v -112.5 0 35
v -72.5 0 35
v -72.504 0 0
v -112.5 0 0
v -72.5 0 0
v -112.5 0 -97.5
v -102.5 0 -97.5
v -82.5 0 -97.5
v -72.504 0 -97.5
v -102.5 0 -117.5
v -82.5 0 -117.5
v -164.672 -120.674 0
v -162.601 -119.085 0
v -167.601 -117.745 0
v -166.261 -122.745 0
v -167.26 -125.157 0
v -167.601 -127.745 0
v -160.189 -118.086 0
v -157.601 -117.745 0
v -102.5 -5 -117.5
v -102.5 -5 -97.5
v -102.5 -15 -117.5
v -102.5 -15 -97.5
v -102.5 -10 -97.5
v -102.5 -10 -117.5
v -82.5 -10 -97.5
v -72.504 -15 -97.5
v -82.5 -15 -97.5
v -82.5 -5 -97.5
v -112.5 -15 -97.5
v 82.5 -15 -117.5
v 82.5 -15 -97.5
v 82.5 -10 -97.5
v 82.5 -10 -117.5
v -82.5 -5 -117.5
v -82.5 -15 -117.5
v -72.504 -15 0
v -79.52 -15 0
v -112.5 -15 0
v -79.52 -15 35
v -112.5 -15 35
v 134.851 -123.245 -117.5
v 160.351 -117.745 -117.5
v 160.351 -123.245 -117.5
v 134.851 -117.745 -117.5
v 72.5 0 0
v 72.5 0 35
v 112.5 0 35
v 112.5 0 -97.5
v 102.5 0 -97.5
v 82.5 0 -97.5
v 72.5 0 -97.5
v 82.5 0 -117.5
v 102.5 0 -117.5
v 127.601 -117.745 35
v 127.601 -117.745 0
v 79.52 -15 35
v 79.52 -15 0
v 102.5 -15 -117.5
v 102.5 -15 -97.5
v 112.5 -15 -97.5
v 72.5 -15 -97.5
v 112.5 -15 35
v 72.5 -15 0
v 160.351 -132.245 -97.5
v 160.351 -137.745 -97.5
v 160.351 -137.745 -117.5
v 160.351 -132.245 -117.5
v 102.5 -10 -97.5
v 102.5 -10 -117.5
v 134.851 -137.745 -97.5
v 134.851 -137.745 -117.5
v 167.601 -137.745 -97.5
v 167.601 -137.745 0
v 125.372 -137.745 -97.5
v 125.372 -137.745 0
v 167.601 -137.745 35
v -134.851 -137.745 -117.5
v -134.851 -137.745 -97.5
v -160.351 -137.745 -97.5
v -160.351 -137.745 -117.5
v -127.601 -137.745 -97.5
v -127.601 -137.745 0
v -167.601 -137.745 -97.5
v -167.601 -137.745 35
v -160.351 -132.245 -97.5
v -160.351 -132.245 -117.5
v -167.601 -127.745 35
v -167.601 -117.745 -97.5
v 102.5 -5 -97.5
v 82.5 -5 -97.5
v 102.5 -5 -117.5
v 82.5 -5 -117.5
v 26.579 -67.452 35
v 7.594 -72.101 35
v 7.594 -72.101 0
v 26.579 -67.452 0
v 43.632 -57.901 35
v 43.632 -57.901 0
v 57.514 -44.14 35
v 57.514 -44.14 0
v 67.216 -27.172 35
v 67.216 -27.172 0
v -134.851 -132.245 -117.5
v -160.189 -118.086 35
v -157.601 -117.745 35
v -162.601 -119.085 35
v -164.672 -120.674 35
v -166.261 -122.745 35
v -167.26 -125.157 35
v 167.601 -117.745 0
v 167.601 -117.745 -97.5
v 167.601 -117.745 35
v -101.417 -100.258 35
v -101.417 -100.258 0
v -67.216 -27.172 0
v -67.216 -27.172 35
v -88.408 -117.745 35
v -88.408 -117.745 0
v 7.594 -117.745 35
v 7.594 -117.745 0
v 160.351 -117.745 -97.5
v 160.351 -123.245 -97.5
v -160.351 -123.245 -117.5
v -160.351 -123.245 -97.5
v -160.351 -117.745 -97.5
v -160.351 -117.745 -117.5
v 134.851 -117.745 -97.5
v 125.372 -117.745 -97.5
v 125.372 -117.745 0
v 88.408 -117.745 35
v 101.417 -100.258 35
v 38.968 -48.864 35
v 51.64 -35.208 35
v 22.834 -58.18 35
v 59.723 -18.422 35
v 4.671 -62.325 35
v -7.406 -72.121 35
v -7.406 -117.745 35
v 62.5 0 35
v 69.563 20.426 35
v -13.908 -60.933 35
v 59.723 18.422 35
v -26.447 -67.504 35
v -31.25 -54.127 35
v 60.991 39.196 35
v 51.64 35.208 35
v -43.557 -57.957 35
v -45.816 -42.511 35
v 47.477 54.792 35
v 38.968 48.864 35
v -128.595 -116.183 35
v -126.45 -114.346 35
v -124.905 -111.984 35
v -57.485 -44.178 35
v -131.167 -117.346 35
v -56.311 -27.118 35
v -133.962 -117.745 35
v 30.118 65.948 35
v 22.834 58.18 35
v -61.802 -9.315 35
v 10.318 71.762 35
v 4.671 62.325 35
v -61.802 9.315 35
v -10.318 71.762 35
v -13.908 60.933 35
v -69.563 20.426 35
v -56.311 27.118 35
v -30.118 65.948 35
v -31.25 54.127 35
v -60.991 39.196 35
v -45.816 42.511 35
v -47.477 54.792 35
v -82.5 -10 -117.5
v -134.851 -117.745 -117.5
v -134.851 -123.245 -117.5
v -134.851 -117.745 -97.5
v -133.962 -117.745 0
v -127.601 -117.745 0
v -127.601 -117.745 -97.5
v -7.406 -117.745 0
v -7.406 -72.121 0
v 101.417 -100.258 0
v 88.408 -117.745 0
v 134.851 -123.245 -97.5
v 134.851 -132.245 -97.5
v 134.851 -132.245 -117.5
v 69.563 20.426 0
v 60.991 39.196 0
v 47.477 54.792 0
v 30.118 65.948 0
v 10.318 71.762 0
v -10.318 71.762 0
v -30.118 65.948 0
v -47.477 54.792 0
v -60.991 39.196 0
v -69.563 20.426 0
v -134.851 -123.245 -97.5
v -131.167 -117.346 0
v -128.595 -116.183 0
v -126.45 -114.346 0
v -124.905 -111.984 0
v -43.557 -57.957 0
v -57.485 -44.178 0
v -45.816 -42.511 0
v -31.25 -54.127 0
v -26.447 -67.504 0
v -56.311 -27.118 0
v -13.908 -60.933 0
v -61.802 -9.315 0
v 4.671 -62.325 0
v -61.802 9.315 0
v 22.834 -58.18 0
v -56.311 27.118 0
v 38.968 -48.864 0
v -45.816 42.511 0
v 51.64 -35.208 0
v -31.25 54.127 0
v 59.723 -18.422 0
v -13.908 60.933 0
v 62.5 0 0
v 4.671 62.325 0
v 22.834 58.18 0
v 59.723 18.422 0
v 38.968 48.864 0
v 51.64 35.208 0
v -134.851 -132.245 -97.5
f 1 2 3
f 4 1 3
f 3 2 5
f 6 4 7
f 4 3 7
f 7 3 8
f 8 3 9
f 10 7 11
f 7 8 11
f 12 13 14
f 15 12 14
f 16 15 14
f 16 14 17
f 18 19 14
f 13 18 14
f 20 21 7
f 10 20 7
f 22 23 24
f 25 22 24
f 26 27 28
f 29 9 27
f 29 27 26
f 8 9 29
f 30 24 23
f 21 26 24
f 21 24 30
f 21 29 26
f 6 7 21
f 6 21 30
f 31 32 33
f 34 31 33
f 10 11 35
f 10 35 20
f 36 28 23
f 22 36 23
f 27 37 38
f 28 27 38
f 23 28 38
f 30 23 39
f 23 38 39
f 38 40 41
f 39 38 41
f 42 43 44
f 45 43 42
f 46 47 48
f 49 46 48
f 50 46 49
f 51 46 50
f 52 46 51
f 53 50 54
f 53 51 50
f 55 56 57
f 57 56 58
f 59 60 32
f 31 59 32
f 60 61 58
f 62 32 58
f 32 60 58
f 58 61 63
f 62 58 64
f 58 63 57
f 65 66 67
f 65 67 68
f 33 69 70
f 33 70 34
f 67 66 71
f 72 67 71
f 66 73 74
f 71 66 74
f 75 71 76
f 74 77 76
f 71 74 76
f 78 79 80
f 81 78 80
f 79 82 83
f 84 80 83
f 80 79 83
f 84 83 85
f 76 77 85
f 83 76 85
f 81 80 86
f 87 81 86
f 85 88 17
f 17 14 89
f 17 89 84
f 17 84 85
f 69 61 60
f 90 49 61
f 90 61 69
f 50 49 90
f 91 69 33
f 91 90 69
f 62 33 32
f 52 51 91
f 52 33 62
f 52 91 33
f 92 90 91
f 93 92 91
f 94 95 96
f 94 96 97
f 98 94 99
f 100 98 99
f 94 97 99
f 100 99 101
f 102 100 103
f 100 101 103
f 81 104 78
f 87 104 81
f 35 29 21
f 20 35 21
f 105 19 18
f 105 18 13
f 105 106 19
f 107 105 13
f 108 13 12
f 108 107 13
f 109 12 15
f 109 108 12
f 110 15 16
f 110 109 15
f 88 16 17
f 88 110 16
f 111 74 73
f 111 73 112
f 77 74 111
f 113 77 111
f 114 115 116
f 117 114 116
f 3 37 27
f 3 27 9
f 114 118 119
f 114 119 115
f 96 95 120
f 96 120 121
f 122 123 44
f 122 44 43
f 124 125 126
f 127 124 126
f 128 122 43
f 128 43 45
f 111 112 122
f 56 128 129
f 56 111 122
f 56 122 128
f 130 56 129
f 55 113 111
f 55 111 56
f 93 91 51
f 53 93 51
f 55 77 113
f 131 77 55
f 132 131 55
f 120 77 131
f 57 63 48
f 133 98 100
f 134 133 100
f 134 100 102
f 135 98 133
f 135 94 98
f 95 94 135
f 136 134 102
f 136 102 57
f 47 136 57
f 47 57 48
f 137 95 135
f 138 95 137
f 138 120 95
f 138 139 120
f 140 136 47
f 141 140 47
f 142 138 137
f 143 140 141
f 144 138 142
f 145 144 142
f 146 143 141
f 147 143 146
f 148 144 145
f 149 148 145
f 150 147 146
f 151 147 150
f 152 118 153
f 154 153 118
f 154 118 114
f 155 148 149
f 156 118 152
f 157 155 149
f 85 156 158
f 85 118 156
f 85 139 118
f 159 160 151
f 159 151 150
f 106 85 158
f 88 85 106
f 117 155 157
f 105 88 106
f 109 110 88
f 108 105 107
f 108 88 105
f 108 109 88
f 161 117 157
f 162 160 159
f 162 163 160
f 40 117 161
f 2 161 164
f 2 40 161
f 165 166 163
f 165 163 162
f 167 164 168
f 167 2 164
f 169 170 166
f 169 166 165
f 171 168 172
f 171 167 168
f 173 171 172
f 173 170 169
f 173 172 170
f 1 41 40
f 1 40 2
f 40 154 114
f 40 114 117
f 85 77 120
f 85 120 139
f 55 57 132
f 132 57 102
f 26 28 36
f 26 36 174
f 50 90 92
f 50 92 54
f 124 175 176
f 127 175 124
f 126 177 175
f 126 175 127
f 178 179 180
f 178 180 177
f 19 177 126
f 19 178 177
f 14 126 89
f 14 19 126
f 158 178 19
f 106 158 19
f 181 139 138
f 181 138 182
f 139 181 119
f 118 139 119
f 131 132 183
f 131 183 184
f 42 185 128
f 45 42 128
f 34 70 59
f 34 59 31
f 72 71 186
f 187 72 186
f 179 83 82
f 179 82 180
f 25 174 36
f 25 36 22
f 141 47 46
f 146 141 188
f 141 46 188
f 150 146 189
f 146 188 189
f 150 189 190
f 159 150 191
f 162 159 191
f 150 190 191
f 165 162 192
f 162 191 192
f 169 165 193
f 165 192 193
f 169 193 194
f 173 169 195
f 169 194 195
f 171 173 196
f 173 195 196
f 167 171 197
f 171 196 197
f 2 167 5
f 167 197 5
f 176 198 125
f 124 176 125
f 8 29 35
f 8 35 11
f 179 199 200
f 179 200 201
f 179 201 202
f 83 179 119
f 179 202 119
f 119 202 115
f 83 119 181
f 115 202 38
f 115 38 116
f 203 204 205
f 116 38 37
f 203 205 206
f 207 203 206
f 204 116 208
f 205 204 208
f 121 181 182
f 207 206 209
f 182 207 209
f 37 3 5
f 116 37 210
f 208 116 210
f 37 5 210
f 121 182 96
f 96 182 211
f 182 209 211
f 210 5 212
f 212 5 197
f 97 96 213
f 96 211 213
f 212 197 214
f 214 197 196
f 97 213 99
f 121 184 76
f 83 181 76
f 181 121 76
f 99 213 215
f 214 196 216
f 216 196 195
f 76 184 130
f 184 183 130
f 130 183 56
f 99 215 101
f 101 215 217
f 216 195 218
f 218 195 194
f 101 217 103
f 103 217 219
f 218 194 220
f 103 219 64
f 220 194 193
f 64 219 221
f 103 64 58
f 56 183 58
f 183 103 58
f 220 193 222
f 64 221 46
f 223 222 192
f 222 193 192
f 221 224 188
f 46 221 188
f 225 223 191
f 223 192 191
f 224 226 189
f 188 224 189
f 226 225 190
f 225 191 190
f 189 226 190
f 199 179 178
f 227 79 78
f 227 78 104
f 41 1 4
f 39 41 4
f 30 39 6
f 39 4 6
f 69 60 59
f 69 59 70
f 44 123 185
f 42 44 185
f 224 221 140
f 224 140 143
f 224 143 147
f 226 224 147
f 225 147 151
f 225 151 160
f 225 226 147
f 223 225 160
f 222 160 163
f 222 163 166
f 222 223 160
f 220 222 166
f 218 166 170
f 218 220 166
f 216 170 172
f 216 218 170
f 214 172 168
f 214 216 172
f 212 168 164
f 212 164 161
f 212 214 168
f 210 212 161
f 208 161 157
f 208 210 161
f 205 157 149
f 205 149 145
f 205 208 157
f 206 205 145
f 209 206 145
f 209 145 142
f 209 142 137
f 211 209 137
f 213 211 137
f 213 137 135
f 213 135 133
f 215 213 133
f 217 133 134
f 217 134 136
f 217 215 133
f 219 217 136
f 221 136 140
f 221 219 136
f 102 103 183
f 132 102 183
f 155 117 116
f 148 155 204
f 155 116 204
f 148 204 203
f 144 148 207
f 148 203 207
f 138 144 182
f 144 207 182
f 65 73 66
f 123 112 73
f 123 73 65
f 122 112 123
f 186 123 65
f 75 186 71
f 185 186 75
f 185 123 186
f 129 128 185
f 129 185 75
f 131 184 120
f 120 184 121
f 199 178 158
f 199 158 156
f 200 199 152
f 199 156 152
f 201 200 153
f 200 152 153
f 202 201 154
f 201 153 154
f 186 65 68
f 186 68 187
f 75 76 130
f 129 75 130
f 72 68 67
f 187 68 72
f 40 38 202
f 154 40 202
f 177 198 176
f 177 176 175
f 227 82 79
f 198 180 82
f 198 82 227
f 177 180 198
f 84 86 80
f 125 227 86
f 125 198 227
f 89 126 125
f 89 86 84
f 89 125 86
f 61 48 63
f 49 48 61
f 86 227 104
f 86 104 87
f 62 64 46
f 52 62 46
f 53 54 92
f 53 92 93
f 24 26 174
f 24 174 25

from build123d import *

# Parameters (mm, degrees)
SKETCH1_R            = 62.5
BOSS_EXTRUDE8_DEPTH  = 35
BOSS_EXTRUDE9_REACH  = 192.245
SKETCH2_W            = 15
SKETCH2_H            = 35
FILLET4_R            = 10
FILLET5_R            = 10
SKETCH10_W           = 35
SKETCH10_H           = 15
BOSS_EXTRUDE12_DEPTH = 40
SKETCH6_W            = 35
SKETCH6_H            = 15
BOSS_EXTRUDE10_DEPTH = 40
SKETCH12_W           = 42.229373335
SKETCH12_H           = 20
SKETCH12_W_2         = 40
SKETCH12_H_2         = 15
SKETCH12_W_3         = 39.995847529
BOSS_EXTRUDE13_DEPTH = 97.5
SKETCH13_W           = 20
SKETCH13_H           = 5
SKETCH13_W_2         = 25.5
SKETCH13_H_2         = 5.5
BOSS_EXTRUDE14_DEPTH = 20


with BuildPart() as part:
    # Sketch1 → Boss-Extrude8 (new body)
    with BuildSketch(Plane.XY):
        with BuildLine():
            Line((127.600917431, -117.745016448), (72.5, 0))
            ThreePointArc((72.5, 0), (0, 72.5), (-72.5, 0))
            Line((-72.5, 0), (-127.600917431, -117.745016448))
            Line((-127.600917431, -117.745016448), (-167.600917431, -117.745016448))
            Line((-167.600917431, -117.745016448), (-167.600917431, -137.745016448))
            Line((-167.600917431, -137.745016448), (167.600917431, -137.745016448))
            Line((167.600917431, -137.745016448), (167.600917431, -117.745016448))
            Line((167.600917431, -117.745016448), (127.600917431, -117.745016448))
        make_face()
        with BuildLine():
            ThreePointArc((-67.21559633, -27.171926873), (0, -72.5), (67.21559633, -27.171926873))
            Line((67.21559633, -27.171926873), (101.417450928, -100.25778678))
            Line((101.417450928, -100.25778678), (88.408256881, -117.745016448))
            Line((88.408256881, -117.745016448), (-88.408256881, -117.745016448))
            Line((-88.408256881, -117.745016448), (-101.417450928, -100.25778678))
            Line((-101.417450928, -100.25778678), (-67.21559633, -27.171926873))
        make_face(mode=Mode.SUBTRACT)
        Circle(SKETCH1_R, mode=Mode.SUBTRACT)
    extrude(amount=BOSS_EXTRUDE8_DEPTH)

    # Sketch2 → Boss-Extrude9 (add, up to next)
    with BuildSketch(Plane(origin=(0, -117.745016448, 0), x_dir=(1, 0, 0), z_dir=(0, 1, 0)), mode=Mode.PRIVATE) as boss_extrude9_sk1:
        with Locations((0.093911399, -17.5)):
            Rectangle(SKETCH2_W, SKETCH2_H)
    boss_extrude9_tool1 = extrude(boss_extrude9_sk1.sketch, amount=BOSS_EXTRUDE9_REACH, mode=Mode.PRIVATE) - part.part
    add(boss_extrude9_tool1.solids().sort_by_distance((0.093911, -117.745016, 17.5))[0])

    # Fillet4
    fillet4_edges = [part.edges().sort_by_distance(p)[0] for p in [
        (-167.600917431, -117.745016448, 17.5),
    ]]
    fillet(fillet4_edges, radius=FILLET4_R)

    # Fillet5
    fillet5_edges = [part.edges().sort_by_distance(p)[0] for p in [
        (-127.600917431, -117.745016448, 17.5),
    ]]
    fillet(fillet5_edges, radius=FILLET5_R)

    # Sketch10 → Boss-Extrude12 (add)
    with BuildSketch(Plane(origin=(-72.5, 0, 0), x_dir=(0, 0, -1), z_dir=(1, 0, 0))):
        with Locations((-17.5, -7.5)):
            Rectangle(SKETCH10_W, SKETCH10_H)
    extrude(amount=-BOSS_EXTRUDE12_DEPTH)

    # Sketch6 → Boss-Extrude10 (add)
    with BuildSketch(Plane(origin=(72.5, 0, 0), x_dir=(0, 0, -1), z_dir=(1, 0, 0))):
        with Locations((-17.5, -7.5)):
            Rectangle(SKETCH6_W, SKETCH6_H)
    extrude(amount=BOSS_EXTRUDE10_DEPTH)

    # Sketch12 → Boss-Extrude13 (add)
    with BuildSketch(Plane(origin=(0, 0, 0), x_dir=(-1, 0, 0), z_dir=(0, 0, -1))):
        with Locations((-146.486230764, -127.745016448)):
            Rectangle(SKETCH12_W, SKETCH12_H)
        with Locations((147.600917431, -127.745016448)):
            Rectangle(SKETCH12_W_2, SKETCH12_H)
        with Locations((-92.5, -7.5)):
            Rectangle(SKETCH12_W_2, SKETCH12_H_2)
        with Locations((92.502076235, -7.5)):
            Rectangle(SKETCH12_W_3, SKETCH12_H_2)
    extrude(amount=BOSS_EXTRUDE13_DEPTH)

    # Sketch13 → Boss-Extrude14 (add)
    with BuildSketch(Plane(origin=(0, 0, -97.5), x_dir=(-1, 0, 0), z_dir=(0, 0, -1))):
        with Locations((-92.5, -2.5)):
            Rectangle(SKETCH13_W, SKETCH13_H)
        with Locations((-92.5, -12.5)):
            Rectangle(SKETCH13_W, SKETCH13_H)
        with Locations((92.5, -2.5)):
            Rectangle(SKETCH13_W, SKETCH13_H)
        with Locations((92.5, -12.5)):
            Rectangle(SKETCH13_W, SKETCH13_H)
        with Locations((147.600917431, -120.495016448)):
            Rectangle(SKETCH13_W_2, SKETCH13_H_2)
        with Locations((147.600917431, -134.995016448)):
            Rectangle(SKETCH13_W_2, SKETCH13_H_2)
        with Locations((-147.600917431, -120.495016448)):
            Rectangle(SKETCH13_W_2, SKETCH13_H_2)
        with Locations((-147.600917431, -134.995016448)):
            Rectangle(SKETCH13_W_2, SKETCH13_H_2)
    extrude(amount=BOSS_EXTRUDE14_DEPTH)


solid = part.part
